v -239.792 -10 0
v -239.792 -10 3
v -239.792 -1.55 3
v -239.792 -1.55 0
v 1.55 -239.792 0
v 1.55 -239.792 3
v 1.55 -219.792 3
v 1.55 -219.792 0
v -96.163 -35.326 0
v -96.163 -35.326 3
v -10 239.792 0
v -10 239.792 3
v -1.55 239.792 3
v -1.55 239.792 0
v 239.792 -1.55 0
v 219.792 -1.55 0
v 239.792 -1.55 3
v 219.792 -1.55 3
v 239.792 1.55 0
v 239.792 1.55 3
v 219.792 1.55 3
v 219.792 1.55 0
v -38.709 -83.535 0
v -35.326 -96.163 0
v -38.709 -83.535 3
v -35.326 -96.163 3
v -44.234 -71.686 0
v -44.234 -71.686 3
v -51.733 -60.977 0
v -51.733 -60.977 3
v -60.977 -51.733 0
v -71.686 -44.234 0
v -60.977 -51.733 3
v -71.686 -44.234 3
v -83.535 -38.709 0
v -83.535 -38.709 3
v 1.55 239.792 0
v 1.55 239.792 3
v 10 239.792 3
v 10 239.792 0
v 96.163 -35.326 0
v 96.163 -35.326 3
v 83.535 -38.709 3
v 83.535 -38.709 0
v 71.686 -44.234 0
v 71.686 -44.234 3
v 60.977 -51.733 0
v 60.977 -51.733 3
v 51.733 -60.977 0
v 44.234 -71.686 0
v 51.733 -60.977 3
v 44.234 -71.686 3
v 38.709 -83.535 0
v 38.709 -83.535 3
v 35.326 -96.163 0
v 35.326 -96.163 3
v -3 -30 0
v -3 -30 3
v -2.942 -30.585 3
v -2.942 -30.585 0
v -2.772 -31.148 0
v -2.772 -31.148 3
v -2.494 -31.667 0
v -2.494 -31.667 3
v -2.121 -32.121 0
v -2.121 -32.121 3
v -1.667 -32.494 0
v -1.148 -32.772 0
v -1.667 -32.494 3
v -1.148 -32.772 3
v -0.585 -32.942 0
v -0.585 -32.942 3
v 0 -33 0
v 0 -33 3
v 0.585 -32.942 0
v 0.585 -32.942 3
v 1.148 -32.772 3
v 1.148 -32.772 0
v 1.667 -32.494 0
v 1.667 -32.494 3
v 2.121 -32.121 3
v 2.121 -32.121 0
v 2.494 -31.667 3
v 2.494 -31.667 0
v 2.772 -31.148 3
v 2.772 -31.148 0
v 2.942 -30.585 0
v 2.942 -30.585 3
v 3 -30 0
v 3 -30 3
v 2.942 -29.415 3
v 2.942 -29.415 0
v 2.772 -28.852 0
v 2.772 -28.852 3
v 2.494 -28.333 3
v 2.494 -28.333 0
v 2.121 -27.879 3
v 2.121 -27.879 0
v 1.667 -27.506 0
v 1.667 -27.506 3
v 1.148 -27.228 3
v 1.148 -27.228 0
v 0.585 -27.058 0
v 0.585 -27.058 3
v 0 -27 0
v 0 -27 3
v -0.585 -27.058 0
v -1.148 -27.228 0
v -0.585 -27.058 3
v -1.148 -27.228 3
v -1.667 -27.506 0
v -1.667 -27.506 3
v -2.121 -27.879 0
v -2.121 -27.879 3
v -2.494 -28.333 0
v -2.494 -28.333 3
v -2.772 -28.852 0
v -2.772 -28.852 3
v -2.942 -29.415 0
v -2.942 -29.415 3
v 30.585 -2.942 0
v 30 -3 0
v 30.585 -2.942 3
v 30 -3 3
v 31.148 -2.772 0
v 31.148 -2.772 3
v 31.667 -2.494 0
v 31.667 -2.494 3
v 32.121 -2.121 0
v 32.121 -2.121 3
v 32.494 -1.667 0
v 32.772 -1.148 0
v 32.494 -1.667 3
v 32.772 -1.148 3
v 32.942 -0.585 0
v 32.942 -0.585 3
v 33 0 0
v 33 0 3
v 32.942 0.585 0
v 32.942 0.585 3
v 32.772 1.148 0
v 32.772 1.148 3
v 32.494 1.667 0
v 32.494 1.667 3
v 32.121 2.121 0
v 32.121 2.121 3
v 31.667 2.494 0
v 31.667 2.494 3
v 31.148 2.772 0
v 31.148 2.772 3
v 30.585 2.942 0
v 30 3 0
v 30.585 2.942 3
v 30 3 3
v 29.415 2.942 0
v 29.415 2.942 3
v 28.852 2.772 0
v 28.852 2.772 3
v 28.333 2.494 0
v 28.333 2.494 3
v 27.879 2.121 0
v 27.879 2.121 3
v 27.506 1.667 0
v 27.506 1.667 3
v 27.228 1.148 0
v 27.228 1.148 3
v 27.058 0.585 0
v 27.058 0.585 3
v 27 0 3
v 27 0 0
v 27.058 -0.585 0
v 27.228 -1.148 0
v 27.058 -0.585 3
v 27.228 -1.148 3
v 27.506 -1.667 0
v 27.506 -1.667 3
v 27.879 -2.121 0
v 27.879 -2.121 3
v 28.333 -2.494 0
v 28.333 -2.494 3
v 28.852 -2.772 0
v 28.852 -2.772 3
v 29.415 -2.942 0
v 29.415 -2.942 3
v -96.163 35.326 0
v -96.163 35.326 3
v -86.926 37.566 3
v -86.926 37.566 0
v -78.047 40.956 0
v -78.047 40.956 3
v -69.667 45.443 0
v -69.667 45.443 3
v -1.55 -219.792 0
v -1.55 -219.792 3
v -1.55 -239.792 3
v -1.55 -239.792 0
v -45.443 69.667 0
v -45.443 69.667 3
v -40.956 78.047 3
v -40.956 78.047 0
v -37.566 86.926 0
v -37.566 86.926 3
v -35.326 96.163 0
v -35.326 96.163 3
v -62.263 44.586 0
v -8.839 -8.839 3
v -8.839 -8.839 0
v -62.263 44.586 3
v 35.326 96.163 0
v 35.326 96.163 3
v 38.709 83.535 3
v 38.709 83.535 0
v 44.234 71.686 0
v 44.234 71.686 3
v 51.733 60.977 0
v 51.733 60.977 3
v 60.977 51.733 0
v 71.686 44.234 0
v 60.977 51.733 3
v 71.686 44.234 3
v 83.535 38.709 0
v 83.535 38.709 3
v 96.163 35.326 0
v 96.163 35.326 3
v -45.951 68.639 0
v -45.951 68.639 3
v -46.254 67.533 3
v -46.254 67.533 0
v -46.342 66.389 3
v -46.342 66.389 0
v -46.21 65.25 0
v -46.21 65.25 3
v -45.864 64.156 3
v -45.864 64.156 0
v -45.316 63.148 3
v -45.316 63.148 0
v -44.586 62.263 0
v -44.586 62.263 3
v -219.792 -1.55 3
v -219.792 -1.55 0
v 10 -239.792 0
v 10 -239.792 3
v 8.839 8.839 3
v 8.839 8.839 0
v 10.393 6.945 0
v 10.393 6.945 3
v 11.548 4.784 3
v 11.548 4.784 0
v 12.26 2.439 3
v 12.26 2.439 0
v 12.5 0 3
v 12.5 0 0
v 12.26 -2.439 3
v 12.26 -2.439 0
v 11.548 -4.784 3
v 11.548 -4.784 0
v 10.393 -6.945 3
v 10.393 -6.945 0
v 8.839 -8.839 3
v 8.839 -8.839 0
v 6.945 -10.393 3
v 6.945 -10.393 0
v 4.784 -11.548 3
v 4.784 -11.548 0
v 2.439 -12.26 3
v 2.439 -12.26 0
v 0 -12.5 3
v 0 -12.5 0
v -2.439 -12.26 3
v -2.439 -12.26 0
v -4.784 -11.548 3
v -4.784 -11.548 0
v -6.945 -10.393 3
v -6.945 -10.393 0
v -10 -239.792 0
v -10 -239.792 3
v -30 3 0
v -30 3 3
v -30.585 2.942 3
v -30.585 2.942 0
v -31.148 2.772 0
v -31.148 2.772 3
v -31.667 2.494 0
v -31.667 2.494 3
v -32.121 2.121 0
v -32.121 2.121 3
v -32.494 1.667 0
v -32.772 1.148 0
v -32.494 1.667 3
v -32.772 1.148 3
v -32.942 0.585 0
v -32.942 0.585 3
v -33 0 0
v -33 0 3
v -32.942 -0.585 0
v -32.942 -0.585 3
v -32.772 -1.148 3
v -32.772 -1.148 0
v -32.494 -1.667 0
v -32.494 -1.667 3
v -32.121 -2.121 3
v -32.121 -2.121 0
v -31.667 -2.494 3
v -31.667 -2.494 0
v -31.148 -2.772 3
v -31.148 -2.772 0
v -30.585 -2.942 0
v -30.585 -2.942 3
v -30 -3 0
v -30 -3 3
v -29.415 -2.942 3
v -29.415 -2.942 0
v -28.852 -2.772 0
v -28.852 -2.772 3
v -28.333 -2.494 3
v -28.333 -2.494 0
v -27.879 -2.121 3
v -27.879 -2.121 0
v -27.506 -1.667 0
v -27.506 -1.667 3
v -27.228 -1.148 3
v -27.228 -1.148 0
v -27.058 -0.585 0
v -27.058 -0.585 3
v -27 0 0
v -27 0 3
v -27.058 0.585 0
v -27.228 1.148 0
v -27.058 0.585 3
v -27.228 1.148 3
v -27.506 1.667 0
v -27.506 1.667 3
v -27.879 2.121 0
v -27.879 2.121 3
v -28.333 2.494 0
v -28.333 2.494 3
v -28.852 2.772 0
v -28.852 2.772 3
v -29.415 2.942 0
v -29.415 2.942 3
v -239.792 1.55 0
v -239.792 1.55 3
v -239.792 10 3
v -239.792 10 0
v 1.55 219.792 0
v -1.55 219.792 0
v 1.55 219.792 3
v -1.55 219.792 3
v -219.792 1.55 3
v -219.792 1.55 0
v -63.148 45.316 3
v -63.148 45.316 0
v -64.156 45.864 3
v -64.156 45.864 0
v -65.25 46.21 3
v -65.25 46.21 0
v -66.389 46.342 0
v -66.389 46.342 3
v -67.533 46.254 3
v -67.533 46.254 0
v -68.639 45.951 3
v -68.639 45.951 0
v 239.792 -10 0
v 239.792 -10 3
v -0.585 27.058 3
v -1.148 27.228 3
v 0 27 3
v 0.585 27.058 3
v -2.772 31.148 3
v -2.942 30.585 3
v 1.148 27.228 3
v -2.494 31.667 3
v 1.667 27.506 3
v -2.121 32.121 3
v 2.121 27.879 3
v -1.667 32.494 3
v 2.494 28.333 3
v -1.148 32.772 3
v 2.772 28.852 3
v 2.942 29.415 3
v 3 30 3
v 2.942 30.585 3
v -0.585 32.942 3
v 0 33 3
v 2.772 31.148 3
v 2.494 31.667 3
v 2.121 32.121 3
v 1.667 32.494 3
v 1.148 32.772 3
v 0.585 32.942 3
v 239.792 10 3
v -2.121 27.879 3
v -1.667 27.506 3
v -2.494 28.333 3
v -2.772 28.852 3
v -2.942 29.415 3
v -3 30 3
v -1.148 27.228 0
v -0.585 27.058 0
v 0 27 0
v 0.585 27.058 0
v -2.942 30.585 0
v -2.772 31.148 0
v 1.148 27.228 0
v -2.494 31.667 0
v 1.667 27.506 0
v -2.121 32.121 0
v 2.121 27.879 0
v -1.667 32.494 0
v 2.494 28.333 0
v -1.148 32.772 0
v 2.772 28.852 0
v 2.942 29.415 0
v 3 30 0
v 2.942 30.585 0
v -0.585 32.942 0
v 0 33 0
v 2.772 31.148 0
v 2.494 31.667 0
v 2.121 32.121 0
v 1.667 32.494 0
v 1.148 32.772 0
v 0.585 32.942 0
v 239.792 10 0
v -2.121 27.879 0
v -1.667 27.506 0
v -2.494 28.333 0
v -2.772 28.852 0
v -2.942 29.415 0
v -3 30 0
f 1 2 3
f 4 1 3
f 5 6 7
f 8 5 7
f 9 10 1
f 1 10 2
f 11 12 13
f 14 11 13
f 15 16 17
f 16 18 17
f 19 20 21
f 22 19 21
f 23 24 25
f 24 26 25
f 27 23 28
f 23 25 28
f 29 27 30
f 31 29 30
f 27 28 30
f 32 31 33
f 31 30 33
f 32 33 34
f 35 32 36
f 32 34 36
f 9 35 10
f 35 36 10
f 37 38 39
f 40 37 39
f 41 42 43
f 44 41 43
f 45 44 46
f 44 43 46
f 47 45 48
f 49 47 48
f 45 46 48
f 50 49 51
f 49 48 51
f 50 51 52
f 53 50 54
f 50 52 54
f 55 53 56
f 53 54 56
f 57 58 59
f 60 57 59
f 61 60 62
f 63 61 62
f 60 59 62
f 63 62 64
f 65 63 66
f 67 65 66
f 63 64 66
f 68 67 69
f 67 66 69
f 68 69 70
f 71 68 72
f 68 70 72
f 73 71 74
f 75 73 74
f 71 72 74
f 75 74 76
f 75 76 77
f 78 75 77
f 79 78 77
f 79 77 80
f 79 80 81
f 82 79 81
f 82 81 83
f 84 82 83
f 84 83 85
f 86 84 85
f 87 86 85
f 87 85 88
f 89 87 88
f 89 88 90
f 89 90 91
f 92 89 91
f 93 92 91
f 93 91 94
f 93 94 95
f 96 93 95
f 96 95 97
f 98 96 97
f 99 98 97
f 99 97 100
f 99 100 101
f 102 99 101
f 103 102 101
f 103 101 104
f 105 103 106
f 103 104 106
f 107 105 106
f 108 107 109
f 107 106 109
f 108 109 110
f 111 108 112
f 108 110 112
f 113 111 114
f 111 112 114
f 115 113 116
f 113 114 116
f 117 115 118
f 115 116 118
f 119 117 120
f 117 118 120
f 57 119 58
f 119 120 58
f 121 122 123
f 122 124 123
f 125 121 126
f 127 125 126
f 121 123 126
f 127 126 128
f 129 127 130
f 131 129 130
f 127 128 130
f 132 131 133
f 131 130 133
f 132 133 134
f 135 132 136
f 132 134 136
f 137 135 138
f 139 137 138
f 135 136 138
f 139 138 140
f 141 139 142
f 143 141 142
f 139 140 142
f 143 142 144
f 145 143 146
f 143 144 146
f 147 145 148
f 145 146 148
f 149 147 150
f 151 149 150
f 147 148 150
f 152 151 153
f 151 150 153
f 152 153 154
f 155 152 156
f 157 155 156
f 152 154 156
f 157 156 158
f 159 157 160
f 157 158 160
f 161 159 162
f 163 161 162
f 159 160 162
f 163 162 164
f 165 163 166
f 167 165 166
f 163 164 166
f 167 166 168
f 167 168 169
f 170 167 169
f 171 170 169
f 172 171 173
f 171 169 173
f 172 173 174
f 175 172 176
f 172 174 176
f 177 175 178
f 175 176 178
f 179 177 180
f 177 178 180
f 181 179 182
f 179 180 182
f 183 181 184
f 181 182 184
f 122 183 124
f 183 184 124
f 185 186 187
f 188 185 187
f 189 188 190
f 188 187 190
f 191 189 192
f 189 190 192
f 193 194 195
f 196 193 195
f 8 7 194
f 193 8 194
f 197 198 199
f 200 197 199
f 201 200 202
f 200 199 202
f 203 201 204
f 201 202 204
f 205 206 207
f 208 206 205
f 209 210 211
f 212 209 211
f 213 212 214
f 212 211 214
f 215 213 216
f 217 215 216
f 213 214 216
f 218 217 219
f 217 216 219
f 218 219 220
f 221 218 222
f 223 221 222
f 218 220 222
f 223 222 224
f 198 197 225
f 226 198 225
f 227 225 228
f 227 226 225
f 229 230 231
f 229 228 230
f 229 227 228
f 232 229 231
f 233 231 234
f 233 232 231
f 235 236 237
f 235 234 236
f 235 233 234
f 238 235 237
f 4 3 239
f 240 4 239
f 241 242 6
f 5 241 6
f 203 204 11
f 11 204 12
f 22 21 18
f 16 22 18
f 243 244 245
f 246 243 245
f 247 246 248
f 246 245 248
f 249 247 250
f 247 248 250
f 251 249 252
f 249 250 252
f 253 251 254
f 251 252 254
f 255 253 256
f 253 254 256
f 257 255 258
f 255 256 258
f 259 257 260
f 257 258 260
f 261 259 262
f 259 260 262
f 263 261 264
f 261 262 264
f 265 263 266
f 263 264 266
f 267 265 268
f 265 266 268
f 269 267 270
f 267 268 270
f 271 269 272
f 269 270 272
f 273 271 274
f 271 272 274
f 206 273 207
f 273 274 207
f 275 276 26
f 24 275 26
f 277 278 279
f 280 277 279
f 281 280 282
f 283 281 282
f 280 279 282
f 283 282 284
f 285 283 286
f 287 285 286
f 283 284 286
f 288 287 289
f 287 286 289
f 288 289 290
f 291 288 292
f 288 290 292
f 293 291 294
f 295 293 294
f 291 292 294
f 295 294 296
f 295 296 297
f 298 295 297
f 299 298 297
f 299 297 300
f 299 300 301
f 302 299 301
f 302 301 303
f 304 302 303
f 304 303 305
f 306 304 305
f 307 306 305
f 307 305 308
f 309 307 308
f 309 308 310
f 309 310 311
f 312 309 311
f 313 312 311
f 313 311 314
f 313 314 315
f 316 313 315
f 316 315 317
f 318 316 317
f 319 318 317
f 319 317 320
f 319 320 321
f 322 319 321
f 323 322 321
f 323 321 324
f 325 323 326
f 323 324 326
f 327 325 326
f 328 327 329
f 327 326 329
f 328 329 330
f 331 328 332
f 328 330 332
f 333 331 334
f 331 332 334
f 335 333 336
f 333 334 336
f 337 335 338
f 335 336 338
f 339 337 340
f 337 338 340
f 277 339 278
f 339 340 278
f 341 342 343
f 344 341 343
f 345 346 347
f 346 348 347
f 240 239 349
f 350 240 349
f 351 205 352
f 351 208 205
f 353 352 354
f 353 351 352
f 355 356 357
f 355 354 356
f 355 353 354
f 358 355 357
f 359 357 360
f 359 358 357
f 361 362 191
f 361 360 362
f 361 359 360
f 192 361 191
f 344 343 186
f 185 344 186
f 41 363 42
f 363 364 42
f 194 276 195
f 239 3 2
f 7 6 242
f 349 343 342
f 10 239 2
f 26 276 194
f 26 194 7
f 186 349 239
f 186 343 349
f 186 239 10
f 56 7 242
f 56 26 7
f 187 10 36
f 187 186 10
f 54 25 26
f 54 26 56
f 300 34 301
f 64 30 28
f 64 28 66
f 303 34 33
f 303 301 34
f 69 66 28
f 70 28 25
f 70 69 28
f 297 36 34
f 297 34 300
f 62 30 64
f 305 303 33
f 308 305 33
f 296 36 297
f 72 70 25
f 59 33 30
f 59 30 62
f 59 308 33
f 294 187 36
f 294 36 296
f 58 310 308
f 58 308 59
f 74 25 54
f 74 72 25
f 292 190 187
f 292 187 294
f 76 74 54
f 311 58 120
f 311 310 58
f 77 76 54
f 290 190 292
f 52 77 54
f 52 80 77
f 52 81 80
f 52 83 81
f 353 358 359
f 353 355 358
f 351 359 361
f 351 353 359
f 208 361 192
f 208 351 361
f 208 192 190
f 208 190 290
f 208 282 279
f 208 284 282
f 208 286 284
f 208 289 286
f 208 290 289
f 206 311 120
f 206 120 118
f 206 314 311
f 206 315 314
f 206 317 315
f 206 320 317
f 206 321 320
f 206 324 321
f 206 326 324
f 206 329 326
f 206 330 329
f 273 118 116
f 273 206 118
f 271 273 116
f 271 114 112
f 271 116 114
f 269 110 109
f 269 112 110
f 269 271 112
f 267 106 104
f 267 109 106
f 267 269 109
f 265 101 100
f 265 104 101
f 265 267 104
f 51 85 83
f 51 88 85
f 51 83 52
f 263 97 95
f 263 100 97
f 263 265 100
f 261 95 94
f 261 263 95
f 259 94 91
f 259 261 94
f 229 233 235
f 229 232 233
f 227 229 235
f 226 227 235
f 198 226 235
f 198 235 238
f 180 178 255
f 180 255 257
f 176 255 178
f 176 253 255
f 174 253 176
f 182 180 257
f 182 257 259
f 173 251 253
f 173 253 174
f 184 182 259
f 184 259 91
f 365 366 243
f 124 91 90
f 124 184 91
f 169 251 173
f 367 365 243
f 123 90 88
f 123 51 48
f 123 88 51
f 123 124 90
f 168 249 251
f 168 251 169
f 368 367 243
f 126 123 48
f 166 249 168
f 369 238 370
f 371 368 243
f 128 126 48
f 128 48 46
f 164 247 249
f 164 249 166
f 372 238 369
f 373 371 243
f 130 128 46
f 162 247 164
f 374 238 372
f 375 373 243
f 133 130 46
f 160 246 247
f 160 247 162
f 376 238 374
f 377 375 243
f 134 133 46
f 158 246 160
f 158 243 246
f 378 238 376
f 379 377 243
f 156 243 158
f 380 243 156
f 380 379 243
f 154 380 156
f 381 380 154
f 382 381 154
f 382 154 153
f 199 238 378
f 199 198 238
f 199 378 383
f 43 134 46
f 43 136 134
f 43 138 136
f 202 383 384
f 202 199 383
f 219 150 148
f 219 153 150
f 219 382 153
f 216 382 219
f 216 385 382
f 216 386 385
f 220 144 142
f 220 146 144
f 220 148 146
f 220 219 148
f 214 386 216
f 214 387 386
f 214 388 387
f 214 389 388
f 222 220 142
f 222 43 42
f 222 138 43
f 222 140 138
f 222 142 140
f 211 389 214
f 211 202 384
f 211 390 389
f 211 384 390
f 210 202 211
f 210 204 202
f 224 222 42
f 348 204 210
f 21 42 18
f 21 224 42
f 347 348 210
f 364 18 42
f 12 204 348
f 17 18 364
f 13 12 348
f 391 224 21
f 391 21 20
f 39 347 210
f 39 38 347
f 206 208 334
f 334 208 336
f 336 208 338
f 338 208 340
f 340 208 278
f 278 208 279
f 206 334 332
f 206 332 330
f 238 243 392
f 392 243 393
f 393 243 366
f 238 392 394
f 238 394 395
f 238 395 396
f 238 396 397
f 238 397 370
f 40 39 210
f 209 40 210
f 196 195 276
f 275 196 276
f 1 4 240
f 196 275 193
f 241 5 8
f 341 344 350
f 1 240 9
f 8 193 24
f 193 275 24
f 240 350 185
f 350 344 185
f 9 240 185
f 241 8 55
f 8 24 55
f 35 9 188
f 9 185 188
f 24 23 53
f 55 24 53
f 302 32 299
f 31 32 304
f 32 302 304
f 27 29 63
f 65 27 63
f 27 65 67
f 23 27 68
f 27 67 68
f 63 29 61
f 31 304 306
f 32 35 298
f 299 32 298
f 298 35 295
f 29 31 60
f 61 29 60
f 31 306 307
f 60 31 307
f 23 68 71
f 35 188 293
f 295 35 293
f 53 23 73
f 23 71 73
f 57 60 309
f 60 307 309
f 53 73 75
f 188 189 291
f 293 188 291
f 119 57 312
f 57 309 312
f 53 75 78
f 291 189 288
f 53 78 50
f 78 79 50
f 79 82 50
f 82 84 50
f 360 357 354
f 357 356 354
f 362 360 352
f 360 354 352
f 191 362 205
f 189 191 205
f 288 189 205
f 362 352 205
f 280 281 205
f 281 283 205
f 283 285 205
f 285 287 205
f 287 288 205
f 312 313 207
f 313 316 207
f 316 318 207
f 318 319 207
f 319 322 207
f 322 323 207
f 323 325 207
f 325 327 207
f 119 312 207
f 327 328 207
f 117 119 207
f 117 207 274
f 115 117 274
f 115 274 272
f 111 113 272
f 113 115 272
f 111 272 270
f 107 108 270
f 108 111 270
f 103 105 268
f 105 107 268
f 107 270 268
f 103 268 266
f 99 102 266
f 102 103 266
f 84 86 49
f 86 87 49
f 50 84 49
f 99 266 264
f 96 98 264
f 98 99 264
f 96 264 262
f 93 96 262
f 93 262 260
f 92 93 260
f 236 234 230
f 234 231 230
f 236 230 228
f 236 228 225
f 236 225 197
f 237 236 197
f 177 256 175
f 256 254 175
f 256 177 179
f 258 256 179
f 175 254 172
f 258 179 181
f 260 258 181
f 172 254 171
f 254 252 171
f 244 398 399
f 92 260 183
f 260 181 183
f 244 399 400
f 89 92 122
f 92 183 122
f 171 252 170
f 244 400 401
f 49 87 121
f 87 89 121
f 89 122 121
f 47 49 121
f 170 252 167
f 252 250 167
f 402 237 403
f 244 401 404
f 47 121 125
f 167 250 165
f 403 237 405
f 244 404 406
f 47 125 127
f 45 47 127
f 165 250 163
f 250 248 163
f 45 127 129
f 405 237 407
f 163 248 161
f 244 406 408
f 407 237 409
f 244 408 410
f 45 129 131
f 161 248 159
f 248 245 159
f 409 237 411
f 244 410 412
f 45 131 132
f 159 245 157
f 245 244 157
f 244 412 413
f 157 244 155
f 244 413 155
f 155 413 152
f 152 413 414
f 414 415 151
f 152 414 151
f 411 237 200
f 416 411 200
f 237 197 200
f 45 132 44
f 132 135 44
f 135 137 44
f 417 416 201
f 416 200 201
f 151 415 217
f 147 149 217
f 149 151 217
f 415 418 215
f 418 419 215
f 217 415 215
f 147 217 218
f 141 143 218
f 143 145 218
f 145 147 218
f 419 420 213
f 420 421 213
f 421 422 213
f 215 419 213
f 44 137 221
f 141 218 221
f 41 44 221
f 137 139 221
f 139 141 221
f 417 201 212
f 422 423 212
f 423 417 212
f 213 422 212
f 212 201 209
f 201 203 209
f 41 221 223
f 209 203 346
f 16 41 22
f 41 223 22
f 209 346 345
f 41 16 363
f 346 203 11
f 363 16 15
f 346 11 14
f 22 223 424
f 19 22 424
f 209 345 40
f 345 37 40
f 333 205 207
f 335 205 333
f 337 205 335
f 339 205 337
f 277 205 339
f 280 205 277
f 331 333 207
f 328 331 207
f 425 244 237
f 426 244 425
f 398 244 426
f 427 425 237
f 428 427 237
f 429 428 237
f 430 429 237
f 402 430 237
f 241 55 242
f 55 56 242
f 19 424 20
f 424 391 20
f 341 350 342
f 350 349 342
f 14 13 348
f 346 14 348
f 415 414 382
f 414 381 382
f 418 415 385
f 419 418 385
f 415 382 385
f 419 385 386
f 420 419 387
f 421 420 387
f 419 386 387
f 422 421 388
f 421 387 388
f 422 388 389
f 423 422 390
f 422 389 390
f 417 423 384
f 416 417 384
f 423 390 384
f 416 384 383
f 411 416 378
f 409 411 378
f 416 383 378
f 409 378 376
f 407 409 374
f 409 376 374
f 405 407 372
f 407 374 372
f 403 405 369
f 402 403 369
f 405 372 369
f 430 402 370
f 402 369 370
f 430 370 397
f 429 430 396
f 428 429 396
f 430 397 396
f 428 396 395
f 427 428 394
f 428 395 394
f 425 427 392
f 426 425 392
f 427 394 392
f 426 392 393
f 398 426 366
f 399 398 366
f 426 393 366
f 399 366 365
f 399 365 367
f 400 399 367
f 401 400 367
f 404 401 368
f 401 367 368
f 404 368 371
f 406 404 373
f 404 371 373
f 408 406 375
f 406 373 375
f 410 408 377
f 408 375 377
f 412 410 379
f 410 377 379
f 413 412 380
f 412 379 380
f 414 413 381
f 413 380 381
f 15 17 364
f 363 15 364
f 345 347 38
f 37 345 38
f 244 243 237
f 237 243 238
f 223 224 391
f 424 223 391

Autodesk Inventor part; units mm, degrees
ref_plane "YZ Plane" through (0, 0, 0) normal (1, 0, 0) x (0, 1, 0)
ref_plane "XZ Plane" through (0, 0, 0) normal (0, 1, 0) x (-1, 0, 0)
ref_plane "XY Plane" through (0, 0, 0) normal (0, 0, 1) x (1, 0, 0)
sketch "Sketch1" plane through (0, 0, 0) normal (0, 0, 1) x (1, 0, 0)
  circle A0 centre (0, 0) radius 37.5 construction
  circle A1 centre (0, 0) radius 12.5
  line L0 (0, 12.5) -> (35.3553, 12.5) construction
  line L1 (0, -12.5) -> (35.3553, -12.5) construction
  circle A2 centre (0, 0) radius 240
  dimension "d15" = 25
  dimension "d16" = 75
  dimension "d25" = 480
extrude "Plate1" add sketch "Sketch1" along normal blind 3
sketch "Sketch2" plane through (0, 0, 0) normal (0, 0, -1) x (-1, 0, 0)
  line L0 (18.691, -4.6928) -> (218.691, -4.6928) construction
  line L1 (218.691, -4.6928) -> (218.691, -24.6928) construction
  line L2 (218.691, -24.6928) -> (18.691, -24.6928) construction
  line L3 (18.691, -24.6928) -> (18.691, -4.6928) construction
  point P0 (0, 0)
  point P1 (-251, -525)
  dimension "d6" = 200
  dimension "d9" = 20
mark "Mark1"
sketch "Sketch4" plane through (0, 0, 3) normal (0, 0, 1) x (1, 0, 0)
  circle A0 centre (0, 0) radius 12.5 construction
  circle A1 centre (0, 0) radius 240 projected
  line L0 (0, 0) -> (240, 0) construction
  line L1 (0, 0) -> (169.7056, 169.7056) construction
  line L2 (-10, 239.7916) -> (10, 239.7916)
  circle A2 centre (0, 0) radius 240 projected
  line L3 (239.7916, -10) -> (239.7916, 10)
  line L4 (10, 239.7916) -> (35.3257, 96.1626)
  arc A3 (35.3257, 96.1626) -> (96.1626, 35.3257) centre (109.1862, 109.1862) ccw
  line L5 (96.1626, 35.3257) -> (239.7916, 10)
  line L6 (-1.55, 239.7916) -> (-1.55, 219.7916)
  line L7 (-1.55, 219.7916) -> (1.55, 219.7916)
  line L8 (1.55, 219.7916) -> (1.55, 239.7916)
  circle A4 centre (0, 30) radius 3
  line L9 (0, 30) -> (0, 0) construction
  circle A5 centre (0, 0) radius 30 construction
  point P0 (0, 219.7916)
  point P1 (0, 239.7916)
  point P2 (239.7916, 10)
  point P3 (10, 239.7916)
  point P4 (10, 239.7916)
  dimension "d39" = 60
  dimension "d28" = 20
  dimension "d29" = 45
  dimension "d30" = 10
  dimension "d31" = 75
  dimension "d32" = 3.1
  dimension "d33" = 20
  dimension "d40" = 90
  dimension "d41" = 6
extrude "Cut2" cut sketch "Sketch4" against normal blind 3 contours L5 A3 L4 A1 | L2 A1 | L8 L7 L6 L2 | A4
pattern_circular "Circular Pattern2" count 4 over 360 about axis through (0, 0, 0) along (0, 0, 1) of "Cut2"
sketch "Sketch5" plane through (0, 0, 3) normal (0, 0, 1) x (1, 0, 0)
  circle A0 centre (0, 0) radius 12.5 projected
  line L0 (8.8388, 8.8388) -> (-61.8718, 79.5495)
  line L1 (-8.8388, -8.8388) -> (-79.5495, 61.8718)
  line L2 (-79.5495, 61.8718) -> (-61.8718, 79.5495)
  line L3 (0, 0) -> (0, 35.5933) construction
  dimension "d42" = 45
  dimension "d43" = 100
extrude "Cut3" cut sketch "Sketch5" against normal blind 3 contours A0 L1 L2 L0
fillet "Corner Round1" radius 6 2 edges at (-48.0562, 65.7338, 1.5) (-65.7338, 48.0562, 1.5)
equation "\"d2\" = Thickness"
equation "\"BendReliefWidth\" = Thickness"
equation "\"BendReliefDepth\" = 0.5 * Thickness"
equation "\"CornerReliefSize\" = 4 * Thickness"
equation "\"MinimumRemnant\" = 2 * Thickness"
equation "\"TransitionRadius\" = BendRadius"
equation "\"JacobiRadiusSize\" = BendRadius"
equation "\"GapSize\" = Thickness"
equation "\"Thickness\" = 3"
equation "\"BendRadius\" = 2.75"
properties part number "TRM 030 star main" material "AISI 304"
